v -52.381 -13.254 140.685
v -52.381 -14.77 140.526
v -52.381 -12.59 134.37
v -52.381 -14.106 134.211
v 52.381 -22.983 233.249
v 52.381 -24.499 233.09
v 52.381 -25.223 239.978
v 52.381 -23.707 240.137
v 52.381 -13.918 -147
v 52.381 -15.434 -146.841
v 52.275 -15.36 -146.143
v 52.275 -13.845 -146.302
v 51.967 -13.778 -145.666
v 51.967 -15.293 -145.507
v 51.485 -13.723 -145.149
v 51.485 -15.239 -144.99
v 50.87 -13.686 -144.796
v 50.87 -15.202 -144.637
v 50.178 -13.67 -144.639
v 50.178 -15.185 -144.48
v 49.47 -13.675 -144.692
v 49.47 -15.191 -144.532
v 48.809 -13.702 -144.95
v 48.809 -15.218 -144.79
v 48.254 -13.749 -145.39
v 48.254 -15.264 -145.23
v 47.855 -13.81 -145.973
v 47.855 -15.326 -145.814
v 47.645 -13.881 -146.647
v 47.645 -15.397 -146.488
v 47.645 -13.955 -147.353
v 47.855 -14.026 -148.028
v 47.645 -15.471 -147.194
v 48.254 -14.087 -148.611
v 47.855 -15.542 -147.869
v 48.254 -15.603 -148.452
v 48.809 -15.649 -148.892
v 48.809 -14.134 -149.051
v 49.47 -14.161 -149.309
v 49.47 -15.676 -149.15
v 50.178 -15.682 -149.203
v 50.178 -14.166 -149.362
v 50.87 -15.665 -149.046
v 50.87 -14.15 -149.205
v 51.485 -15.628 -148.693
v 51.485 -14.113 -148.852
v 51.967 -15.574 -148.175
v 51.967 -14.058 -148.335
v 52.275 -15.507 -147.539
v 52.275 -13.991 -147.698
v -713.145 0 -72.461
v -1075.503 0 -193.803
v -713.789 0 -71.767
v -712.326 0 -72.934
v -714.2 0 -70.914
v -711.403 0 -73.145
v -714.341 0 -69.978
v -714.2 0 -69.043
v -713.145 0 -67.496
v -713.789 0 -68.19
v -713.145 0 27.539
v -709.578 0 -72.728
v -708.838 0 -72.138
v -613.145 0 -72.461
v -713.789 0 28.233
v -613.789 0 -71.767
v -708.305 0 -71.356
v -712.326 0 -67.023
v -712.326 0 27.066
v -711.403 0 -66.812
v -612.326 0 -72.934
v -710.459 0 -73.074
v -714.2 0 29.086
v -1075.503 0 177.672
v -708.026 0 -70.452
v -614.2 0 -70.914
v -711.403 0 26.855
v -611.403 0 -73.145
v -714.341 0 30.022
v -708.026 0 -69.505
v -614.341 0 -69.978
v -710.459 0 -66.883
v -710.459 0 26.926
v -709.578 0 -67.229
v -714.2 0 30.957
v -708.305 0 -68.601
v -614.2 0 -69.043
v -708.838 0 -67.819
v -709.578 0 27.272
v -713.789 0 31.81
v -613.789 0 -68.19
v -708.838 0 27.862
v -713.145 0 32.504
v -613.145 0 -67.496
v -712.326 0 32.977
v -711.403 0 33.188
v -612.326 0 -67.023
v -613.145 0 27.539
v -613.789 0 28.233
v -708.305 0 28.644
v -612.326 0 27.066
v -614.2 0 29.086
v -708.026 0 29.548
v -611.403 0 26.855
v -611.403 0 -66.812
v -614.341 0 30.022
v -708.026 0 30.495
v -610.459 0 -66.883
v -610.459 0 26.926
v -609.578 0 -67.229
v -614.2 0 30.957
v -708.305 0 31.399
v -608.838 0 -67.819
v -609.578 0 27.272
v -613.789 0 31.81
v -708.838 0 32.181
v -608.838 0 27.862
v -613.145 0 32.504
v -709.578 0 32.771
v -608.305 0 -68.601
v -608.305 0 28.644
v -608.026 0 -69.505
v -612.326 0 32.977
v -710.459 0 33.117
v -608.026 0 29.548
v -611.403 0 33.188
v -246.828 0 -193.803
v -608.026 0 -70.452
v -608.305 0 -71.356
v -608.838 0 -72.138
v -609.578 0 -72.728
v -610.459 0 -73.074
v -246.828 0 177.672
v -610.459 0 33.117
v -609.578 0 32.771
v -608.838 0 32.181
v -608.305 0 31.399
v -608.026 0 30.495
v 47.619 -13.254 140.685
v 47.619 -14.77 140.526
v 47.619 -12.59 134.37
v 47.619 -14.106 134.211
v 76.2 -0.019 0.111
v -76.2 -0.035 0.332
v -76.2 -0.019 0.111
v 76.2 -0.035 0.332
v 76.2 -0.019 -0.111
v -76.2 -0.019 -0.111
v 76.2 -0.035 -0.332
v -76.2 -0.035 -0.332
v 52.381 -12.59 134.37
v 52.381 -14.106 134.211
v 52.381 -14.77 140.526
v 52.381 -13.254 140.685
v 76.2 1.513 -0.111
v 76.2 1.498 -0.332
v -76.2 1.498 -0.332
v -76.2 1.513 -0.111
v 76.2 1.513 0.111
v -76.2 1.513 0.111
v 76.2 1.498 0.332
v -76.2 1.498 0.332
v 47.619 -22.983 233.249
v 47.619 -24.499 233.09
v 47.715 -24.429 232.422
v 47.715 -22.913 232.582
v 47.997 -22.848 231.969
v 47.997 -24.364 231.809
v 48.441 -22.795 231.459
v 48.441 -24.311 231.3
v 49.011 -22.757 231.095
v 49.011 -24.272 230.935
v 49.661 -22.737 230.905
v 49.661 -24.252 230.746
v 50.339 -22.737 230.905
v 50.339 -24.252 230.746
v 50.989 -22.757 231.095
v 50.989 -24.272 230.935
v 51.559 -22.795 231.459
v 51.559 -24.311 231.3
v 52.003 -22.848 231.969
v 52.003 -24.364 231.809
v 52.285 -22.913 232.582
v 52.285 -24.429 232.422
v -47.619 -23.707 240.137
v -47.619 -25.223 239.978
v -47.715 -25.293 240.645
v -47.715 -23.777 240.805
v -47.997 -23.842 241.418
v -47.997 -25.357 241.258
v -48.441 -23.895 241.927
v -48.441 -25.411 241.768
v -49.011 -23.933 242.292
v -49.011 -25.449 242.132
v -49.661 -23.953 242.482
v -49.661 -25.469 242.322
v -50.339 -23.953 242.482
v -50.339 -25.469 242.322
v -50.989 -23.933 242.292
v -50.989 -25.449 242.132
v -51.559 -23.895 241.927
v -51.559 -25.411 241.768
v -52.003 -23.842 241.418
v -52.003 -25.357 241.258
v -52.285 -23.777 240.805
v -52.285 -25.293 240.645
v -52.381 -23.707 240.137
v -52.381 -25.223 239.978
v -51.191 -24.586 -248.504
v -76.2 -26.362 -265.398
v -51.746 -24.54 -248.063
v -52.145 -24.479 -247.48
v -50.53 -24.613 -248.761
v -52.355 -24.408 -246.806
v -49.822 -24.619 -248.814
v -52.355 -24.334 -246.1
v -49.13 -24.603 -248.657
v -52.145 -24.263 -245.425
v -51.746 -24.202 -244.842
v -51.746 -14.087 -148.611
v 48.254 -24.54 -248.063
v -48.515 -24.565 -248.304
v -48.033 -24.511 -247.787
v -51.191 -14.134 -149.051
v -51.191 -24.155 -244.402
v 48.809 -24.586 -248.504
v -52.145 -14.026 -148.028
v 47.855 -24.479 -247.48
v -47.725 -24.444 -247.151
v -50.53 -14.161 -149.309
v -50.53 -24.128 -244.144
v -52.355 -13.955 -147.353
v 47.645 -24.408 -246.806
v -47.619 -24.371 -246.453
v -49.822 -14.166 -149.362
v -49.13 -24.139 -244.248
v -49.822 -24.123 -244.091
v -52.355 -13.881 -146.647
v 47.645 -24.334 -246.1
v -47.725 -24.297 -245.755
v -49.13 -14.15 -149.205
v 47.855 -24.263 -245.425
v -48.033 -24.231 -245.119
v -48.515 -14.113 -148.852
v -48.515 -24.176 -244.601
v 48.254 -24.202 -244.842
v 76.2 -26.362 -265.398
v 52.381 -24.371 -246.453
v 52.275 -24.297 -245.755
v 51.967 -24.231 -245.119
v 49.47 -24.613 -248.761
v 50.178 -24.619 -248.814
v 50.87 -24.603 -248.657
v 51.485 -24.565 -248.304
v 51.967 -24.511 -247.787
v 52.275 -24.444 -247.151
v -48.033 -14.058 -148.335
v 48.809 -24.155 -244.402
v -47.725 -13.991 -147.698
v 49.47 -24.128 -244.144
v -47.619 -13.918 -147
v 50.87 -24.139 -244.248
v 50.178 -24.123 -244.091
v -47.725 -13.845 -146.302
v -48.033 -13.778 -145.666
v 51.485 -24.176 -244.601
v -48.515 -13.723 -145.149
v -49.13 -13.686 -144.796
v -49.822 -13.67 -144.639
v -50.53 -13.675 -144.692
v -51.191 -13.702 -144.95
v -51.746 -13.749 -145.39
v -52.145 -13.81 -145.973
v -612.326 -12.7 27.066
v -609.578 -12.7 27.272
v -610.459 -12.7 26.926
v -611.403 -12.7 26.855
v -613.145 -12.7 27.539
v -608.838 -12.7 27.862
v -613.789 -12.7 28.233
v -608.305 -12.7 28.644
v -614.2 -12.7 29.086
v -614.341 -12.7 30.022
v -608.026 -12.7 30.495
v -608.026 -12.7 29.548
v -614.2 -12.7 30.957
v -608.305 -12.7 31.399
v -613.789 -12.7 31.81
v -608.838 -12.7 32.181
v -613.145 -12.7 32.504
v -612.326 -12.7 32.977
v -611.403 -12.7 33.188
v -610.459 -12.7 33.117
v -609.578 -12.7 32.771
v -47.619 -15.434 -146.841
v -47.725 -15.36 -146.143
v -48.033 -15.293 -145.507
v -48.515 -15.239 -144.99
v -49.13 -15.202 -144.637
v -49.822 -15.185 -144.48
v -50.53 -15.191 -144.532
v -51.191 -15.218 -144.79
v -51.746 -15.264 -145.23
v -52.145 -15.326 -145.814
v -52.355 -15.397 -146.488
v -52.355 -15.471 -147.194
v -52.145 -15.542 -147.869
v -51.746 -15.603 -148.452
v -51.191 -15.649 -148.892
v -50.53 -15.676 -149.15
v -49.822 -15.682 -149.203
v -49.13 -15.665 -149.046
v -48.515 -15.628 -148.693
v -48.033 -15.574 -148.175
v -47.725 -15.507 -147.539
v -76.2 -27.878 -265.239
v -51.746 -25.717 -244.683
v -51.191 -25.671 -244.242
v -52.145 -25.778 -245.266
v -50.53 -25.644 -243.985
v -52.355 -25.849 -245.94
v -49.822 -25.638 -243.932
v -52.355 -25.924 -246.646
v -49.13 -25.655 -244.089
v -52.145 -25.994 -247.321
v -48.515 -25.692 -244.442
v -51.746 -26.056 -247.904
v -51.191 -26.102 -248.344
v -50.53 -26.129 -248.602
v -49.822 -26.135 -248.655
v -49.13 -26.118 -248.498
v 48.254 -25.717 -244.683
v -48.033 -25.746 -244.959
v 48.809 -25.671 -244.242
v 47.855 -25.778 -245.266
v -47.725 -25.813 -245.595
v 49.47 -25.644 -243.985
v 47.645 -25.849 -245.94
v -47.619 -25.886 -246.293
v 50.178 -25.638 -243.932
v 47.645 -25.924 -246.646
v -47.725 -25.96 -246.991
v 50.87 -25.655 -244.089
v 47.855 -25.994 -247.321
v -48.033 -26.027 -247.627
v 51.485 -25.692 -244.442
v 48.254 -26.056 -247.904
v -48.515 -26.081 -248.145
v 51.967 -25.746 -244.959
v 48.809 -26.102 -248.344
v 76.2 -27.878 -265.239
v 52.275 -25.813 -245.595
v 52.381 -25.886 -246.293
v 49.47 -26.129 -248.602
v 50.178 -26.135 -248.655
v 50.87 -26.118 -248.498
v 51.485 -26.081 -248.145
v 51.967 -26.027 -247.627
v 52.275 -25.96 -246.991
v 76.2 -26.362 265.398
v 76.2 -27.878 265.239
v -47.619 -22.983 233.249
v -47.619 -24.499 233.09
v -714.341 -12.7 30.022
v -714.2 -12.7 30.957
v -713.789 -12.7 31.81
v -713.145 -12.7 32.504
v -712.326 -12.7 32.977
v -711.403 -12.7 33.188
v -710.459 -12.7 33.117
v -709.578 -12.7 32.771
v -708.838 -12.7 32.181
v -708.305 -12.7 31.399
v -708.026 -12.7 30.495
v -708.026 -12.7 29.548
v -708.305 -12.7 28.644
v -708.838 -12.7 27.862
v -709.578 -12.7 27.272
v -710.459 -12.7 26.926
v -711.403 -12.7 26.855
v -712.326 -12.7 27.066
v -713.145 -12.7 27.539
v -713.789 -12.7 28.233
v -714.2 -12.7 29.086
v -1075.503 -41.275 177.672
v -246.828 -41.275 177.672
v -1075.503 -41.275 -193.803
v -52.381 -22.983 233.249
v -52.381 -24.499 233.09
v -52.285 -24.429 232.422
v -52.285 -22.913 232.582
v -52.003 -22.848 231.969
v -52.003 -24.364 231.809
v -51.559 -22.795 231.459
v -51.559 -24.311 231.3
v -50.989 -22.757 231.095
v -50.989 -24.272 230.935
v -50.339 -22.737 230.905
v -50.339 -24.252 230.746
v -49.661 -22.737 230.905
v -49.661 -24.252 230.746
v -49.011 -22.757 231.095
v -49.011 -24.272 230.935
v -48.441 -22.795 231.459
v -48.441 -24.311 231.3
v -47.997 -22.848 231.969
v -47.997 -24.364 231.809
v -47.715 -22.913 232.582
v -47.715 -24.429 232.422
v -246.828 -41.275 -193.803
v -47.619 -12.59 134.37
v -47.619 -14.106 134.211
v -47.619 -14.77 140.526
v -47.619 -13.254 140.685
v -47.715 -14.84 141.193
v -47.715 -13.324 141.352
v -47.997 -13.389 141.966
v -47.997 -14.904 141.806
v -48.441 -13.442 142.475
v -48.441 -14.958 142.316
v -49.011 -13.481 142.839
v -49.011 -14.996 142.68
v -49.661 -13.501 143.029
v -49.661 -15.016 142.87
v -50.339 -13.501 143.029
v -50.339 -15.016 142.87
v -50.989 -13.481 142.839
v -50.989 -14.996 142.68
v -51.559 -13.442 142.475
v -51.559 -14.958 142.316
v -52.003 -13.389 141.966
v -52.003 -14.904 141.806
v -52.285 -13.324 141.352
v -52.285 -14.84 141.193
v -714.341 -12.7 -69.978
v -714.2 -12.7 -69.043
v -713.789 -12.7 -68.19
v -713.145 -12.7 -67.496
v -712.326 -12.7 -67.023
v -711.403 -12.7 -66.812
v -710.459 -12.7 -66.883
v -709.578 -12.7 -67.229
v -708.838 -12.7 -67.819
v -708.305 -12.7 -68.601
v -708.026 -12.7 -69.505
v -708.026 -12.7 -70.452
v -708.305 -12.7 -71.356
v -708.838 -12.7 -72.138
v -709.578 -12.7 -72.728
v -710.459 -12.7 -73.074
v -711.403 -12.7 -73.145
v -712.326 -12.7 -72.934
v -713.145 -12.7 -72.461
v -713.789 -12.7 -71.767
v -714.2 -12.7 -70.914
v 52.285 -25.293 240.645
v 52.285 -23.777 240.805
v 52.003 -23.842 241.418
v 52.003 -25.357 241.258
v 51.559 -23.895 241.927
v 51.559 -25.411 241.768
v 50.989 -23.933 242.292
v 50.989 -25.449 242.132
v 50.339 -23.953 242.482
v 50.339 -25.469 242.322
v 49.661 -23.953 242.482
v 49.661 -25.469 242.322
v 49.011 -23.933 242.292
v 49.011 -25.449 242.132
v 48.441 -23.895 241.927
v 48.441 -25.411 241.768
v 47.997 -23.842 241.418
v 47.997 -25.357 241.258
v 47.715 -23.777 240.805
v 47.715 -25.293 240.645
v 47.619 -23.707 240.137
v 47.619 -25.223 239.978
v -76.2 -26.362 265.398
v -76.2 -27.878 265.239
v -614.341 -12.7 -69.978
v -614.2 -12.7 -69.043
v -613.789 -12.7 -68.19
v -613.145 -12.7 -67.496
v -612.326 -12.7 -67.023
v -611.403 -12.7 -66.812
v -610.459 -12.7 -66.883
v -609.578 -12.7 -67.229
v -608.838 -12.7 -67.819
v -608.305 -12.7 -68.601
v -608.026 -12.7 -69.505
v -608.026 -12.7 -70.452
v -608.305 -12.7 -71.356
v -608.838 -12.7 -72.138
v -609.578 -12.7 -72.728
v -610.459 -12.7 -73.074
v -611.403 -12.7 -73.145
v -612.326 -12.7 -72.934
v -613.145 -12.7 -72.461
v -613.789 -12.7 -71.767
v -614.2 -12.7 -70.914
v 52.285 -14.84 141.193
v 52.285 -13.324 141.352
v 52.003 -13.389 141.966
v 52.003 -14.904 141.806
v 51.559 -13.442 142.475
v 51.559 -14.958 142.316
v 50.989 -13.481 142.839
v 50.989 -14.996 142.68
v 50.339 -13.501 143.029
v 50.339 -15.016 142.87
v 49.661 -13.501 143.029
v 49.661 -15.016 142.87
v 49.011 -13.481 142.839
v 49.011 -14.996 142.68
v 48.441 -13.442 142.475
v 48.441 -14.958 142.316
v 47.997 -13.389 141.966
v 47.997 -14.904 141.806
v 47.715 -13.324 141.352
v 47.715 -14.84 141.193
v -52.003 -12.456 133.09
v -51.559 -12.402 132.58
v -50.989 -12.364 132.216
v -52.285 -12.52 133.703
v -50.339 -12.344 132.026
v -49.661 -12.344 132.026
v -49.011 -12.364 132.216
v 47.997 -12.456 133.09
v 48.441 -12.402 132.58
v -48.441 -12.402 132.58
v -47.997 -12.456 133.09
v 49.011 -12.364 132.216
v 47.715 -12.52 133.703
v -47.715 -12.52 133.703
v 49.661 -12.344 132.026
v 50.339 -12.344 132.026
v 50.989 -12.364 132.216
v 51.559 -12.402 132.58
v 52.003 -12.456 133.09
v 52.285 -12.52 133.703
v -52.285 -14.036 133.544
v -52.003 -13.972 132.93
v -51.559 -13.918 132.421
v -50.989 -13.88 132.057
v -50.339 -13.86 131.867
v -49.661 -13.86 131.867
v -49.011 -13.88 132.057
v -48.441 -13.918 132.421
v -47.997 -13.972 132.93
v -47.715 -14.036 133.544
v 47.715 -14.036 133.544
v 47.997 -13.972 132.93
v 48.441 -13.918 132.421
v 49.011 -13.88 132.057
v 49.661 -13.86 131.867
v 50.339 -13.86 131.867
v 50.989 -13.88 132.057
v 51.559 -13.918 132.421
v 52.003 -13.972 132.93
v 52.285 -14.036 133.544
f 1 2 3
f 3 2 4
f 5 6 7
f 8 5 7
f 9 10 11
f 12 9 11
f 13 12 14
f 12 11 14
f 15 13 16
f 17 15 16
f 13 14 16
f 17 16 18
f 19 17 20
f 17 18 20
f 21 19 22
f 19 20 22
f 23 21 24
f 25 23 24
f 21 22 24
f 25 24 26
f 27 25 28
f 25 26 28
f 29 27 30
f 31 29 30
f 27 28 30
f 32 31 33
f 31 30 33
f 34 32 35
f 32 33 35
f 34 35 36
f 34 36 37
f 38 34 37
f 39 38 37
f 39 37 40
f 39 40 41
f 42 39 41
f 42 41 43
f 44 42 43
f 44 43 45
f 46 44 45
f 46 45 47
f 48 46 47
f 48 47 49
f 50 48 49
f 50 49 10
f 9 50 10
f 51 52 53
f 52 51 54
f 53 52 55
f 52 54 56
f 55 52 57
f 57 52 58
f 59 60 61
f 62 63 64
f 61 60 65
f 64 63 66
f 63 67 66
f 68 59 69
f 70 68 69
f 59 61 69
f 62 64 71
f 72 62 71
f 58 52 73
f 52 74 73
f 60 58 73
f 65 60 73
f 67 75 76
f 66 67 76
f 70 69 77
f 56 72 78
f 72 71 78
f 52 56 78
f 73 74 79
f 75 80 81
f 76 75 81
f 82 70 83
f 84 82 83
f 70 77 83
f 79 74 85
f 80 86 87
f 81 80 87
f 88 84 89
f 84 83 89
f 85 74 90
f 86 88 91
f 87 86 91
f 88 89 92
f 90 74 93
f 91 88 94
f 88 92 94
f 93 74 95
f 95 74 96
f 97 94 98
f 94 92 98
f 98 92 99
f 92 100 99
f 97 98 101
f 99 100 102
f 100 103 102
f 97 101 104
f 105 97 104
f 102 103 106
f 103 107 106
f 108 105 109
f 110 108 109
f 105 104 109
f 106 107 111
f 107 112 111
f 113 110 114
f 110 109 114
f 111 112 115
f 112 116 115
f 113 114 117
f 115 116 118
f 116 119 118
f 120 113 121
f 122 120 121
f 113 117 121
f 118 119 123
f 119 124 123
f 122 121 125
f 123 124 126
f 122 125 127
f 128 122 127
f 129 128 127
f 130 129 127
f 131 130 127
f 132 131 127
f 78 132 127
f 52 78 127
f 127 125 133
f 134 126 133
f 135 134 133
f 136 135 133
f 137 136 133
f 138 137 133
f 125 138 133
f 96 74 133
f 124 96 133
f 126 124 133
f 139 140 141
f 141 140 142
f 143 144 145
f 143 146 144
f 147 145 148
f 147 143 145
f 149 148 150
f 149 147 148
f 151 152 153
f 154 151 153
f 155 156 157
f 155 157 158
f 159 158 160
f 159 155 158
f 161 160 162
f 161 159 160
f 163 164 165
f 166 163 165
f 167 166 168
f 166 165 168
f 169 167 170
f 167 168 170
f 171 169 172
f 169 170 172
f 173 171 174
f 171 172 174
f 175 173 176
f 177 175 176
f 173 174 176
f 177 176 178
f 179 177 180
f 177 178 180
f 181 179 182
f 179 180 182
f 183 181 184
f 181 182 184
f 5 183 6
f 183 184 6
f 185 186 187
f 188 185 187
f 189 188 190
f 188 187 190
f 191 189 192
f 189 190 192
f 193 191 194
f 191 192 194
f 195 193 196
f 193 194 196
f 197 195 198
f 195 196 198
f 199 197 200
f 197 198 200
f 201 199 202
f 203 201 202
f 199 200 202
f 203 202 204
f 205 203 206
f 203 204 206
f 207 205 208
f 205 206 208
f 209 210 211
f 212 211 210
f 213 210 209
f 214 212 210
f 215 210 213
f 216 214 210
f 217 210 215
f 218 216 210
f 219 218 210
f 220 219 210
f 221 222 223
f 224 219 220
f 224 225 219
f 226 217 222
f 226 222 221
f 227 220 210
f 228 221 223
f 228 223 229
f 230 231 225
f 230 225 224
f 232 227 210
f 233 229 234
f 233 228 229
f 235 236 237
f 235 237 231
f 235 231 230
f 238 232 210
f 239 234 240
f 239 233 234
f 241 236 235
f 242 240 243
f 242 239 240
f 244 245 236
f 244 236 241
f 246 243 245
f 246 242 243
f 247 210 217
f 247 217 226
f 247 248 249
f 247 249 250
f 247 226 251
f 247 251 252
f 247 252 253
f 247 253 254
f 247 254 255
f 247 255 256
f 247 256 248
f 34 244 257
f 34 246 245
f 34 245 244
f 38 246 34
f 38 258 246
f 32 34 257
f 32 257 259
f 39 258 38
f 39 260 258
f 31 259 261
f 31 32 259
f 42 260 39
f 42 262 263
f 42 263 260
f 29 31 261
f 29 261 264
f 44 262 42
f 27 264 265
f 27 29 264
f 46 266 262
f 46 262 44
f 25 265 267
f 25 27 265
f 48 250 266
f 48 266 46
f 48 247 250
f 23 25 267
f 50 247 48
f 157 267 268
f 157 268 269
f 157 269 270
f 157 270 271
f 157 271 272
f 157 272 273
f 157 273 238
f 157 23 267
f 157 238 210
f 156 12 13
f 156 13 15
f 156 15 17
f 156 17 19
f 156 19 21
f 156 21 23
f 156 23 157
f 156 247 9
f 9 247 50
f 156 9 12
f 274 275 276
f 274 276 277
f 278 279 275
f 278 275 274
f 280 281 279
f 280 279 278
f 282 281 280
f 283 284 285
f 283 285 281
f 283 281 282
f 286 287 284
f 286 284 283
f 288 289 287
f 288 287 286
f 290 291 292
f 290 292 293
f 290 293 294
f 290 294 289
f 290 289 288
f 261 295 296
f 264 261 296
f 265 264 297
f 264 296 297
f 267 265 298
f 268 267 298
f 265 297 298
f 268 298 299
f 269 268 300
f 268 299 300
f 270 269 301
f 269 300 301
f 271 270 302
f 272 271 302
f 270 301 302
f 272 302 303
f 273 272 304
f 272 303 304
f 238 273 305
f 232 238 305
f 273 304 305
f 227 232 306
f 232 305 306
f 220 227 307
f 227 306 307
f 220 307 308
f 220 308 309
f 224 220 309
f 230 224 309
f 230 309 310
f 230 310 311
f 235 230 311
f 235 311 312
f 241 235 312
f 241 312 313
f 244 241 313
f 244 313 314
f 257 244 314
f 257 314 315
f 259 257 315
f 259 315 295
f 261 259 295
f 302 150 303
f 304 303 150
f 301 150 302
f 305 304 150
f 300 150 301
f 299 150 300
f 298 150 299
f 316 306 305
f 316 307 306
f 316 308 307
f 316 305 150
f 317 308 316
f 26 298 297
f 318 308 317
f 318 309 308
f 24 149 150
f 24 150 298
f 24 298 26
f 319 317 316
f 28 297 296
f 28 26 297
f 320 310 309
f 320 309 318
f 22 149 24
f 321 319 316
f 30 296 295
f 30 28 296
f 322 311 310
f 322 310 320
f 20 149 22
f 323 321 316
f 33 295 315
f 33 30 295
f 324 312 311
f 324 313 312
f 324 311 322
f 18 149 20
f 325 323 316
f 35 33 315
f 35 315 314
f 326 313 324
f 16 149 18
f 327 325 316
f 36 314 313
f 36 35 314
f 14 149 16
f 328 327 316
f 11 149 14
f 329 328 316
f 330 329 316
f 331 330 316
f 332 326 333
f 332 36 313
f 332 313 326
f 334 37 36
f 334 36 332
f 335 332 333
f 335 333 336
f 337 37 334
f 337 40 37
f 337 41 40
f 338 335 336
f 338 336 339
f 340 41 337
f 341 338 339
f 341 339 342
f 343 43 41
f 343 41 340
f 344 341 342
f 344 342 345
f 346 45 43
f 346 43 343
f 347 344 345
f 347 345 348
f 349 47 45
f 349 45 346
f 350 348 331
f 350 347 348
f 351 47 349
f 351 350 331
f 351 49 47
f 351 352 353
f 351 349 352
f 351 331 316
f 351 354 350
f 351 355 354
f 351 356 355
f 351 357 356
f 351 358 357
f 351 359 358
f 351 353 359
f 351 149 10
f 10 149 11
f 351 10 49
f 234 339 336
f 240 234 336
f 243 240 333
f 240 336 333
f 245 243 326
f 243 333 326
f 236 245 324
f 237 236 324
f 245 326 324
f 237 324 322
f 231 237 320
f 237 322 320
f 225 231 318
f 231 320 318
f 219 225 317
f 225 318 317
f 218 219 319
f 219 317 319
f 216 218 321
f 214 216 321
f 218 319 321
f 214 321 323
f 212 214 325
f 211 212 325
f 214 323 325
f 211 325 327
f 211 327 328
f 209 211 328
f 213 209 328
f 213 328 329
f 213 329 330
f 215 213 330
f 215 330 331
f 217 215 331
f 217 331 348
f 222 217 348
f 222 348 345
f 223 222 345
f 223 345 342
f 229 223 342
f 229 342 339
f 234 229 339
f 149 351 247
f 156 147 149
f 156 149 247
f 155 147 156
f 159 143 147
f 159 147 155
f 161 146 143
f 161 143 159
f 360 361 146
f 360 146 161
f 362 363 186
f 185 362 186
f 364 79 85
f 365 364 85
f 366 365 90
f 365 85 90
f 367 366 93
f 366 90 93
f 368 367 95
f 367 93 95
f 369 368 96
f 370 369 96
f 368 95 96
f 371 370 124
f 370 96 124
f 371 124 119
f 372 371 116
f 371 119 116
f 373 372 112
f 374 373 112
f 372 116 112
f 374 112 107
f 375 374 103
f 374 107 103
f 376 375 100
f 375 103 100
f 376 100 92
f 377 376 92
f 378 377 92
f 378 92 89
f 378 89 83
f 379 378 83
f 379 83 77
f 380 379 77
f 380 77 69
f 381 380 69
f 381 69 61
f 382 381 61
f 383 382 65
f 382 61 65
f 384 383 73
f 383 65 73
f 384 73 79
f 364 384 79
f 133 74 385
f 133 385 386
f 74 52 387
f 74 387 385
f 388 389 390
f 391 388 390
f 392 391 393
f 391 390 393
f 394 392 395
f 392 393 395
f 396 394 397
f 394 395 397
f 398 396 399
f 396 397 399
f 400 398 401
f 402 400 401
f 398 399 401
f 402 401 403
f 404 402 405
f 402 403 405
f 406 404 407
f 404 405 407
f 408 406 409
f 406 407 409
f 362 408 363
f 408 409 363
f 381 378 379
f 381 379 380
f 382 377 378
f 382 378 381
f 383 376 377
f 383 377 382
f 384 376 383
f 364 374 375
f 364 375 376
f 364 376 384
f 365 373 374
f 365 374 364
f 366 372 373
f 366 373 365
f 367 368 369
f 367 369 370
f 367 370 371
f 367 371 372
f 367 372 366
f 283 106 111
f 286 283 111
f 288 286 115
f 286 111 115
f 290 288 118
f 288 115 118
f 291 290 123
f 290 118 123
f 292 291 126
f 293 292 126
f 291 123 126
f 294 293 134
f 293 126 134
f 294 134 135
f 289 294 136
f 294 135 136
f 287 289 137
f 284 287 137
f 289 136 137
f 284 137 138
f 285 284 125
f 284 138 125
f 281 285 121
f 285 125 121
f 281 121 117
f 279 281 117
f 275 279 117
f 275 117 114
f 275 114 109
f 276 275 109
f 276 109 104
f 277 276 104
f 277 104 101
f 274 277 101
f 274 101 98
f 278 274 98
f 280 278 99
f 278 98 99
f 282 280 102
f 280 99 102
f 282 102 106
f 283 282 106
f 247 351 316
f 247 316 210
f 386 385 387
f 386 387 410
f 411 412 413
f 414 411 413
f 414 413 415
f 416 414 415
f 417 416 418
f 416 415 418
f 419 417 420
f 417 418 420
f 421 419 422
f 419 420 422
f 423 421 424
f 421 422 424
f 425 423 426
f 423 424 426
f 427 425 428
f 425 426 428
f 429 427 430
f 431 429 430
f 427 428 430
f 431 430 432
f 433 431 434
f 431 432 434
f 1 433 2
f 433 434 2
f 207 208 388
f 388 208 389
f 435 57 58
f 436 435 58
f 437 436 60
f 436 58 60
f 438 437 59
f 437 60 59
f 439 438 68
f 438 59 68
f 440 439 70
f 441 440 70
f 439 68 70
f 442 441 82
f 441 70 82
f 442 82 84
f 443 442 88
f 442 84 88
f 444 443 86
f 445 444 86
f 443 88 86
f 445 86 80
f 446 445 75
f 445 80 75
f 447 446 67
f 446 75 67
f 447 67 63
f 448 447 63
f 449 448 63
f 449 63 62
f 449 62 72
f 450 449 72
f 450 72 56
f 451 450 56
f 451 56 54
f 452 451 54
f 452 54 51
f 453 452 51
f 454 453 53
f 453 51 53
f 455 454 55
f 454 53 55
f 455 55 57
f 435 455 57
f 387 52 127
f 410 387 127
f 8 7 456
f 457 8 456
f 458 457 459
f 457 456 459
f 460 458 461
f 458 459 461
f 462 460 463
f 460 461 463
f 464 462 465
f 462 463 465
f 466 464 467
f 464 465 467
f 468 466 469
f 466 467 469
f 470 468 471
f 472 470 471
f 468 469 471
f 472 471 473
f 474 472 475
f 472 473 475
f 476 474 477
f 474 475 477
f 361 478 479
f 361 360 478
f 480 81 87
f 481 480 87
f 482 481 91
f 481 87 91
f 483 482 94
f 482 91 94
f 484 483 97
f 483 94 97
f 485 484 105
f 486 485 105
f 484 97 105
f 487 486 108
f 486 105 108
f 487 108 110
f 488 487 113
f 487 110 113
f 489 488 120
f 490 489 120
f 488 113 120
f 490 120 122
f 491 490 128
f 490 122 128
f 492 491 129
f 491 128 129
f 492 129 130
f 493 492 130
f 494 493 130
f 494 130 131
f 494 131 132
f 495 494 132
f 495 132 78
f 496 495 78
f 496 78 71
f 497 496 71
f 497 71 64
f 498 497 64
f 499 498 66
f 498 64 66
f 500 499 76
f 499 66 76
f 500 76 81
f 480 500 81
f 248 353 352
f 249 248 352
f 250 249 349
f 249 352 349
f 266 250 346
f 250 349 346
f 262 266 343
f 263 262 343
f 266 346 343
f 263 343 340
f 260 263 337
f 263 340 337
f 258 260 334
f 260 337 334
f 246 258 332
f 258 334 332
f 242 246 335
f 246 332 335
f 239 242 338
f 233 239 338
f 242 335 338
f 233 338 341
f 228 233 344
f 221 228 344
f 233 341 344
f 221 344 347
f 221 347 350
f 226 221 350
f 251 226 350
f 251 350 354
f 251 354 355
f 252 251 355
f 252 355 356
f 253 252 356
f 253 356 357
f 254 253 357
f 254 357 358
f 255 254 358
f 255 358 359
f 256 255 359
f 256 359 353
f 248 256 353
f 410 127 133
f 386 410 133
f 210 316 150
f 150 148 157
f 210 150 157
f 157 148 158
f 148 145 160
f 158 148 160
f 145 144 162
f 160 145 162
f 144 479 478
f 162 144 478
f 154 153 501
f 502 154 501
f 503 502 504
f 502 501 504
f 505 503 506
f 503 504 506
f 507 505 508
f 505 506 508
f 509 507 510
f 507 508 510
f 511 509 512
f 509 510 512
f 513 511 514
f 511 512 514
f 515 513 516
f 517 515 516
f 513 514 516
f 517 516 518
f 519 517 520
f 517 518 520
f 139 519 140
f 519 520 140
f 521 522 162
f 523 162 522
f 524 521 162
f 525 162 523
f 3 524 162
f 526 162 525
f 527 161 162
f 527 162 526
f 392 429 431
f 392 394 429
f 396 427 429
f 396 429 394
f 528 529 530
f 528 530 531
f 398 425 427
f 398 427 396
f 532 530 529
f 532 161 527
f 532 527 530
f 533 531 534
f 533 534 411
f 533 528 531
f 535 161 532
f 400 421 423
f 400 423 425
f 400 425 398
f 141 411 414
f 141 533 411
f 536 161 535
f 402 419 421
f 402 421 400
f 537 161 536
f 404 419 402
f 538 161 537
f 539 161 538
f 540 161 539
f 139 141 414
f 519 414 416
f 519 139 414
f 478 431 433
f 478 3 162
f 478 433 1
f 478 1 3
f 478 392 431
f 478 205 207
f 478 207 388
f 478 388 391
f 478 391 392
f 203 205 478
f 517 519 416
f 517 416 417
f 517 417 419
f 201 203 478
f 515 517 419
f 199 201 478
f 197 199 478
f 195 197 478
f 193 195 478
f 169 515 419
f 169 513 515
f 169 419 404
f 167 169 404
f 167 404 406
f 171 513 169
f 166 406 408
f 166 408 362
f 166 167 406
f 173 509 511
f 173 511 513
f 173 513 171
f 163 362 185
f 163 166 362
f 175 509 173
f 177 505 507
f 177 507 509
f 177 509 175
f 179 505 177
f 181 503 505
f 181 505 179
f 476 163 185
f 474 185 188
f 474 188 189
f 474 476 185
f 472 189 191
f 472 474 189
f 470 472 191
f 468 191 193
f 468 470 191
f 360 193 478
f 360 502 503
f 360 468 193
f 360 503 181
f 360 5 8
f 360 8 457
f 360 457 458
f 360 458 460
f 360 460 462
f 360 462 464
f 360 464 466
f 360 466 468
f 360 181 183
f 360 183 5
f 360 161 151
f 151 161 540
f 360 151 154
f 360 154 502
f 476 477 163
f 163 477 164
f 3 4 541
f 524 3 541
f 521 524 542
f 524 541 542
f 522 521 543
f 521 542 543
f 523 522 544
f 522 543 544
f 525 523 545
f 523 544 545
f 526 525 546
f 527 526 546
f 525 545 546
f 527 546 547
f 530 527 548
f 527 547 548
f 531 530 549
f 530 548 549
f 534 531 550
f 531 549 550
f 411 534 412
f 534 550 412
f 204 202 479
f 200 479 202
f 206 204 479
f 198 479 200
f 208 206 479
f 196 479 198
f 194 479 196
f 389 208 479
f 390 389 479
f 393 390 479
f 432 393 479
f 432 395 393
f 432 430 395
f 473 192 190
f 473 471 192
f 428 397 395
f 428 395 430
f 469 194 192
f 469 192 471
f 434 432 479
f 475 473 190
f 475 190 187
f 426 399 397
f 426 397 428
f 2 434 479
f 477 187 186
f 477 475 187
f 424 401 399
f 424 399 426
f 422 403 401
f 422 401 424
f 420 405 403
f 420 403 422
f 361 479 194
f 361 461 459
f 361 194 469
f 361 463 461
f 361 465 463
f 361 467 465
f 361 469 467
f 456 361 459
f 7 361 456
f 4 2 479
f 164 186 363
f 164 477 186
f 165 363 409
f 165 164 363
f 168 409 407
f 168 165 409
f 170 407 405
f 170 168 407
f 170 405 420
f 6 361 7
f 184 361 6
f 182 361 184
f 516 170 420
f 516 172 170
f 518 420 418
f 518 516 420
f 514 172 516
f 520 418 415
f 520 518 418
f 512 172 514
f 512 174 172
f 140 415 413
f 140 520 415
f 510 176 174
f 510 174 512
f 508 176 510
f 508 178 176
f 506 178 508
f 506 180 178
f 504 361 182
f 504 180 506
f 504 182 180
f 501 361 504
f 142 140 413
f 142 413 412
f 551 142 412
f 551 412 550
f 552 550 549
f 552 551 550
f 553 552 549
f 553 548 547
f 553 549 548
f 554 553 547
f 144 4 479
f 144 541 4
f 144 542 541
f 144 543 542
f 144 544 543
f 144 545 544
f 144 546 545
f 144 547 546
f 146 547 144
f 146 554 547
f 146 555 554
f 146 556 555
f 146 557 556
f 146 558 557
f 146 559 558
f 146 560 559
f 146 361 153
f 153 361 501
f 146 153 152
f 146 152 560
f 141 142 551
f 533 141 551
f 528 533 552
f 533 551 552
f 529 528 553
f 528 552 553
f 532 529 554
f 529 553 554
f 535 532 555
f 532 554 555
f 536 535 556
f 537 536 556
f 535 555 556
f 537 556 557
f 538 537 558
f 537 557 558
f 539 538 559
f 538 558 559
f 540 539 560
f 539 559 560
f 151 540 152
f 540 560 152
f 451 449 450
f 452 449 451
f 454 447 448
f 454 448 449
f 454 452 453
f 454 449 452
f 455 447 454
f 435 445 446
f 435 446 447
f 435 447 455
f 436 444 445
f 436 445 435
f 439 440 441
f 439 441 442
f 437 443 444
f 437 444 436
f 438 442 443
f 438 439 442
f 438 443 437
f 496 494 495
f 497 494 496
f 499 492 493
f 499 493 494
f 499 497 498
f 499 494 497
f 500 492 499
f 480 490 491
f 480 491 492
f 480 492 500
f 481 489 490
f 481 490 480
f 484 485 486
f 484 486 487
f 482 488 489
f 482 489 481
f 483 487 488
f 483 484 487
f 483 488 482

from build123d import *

# Parameters (mm, degrees)
F1_DEPTH      = 76.2
F1_DEPTH_BACK = 76.2
F2_R          = 2.38125
F3_DEPTH      = 29.2492825166
F5_DEPTH      = 29.2492825166
F6_W          = 828.675
F6_H          = 371.475
F7_DEPTH      = 41.275
F8_R          = 3.175
F9_DEPTH      = 12.7


with BuildPart() as f1:
    # F0 (on Right) → F1 (new body, two sides)
    with BuildSketch(Plane.YZ) as f1_sk:
        with BuildLine():
            ThreePointArc((-0.0348817698, 0.3318778709), (-0.0174887876, 0), (-0.0348817698, -0.3318778709))
            Line((-0.0348817698, -0.3318778709), (-27.8777411535, -265.2389894947))
            Line((-27.8777411535, -265.2389894947), (-26.3620897849, -265.3982908727))
            Line((-26.3620897849, -265.3982908727), (1.4975128482, -0.3318778709))
            ThreePointArc((1.4975128482, -0.3318778709), (1.5149058304, 0), (1.4975128482, 0.3318778709))
            Line((1.4975128482, 0.3318778709), (-26.3620897849, 265.3982908727))
            Line((-26.3620897849, 265.3982908727), (-27.8777411535, 265.2389894947))
            Line((-27.8777411535, 265.2389894947), (-0.0348817698, 0.3318778709))
        make_face()
    extrude(amount=F1_DEPTH)
    extrude(f1_sk.sketch, amount=-F1_DEPTH_BACK)

    # F2 (on face) → F3 (cut, through all)
    with BuildSketch(Plane(origin=(0, 0, 0), x_dir=(1, 0, 0), z_dir=(0, -0.9945218954, 0.1045284633))):
        with Locations((-50, -147.65)):
            Circle(F2_R)
        with Locations((50, -147.65)):
            Circle(F2_R)
        with Locations((50, -247.65)):
            Circle(F2_R)
        with Locations((-50, -247.65)):
            Circle(F2_R)
    extrude(amount=-F3_DEPTH, mode=Mode.SUBTRACT)

    # F4 (on face) → F5 (cut, through all)
    with BuildSketch(Plane(origin=(0, 0, 0), x_dir=(1, 0, 0), z_dir=(0, -0.9945218954, -0.1045284633))):
        with BuildLine():
            ThreePointArc((-47.61875, 241.3), (-50, 243.68125), (-52.38125, 241.3))
            Line((-52.38125, 241.3), (-52.38125, 234.3735230446))
            ThreePointArc((-52.38125, 234.3735230446), (-50, 231.9922730446), (-47.61875, 234.3735230446))
            Line((-47.61875, 234.3735230446), (-47.61875, 241.3))
        make_face()
        with BuildLine():
            ThreePointArc((52.38125, 241.3), (50, 243.68125), (47.61875, 241.3))
            Line((47.61875, 241.3), (47.61875, 234.3735230446))
            ThreePointArc((47.61875, 234.3735230446), (50, 231.9922730446), (52.38125, 234.3735230446))
            Line((52.38125, 234.3735230446), (52.38125, 241.3))
        make_face()
        with BuildLine():
            Line((52.38125, 134.95), (52.38125, 141.3))
            ThreePointArc((52.38125, 141.3), (50, 143.68125), (47.61875, 141.3))
            Line((47.61875, 141.3), (47.61875, 134.95))
            ThreePointArc((47.61875, 134.95), (50, 132.56875), (52.38125, 134.95))
        make_face()
        with BuildLine():
            ThreePointArc((-47.61875, 141.3), (-50, 143.68125), (-52.38125, 141.3))
            Line((-52.38125, 141.3), (-52.38125, 134.95))
            ThreePointArc((-52.38125, 134.95), (-50, 132.56875), (-47.61875, 134.95))
            Line((-47.61875, 134.95), (-47.61875, 141.3))
        make_face()
    extrude(amount=-F5_DEPTH, mode=Mode.SUBTRACT)


with BuildPart() as f7:
    # F6 (on Front) → F7 (new body)
    with BuildSketch(Plane.XZ):
        with Locations((-661.1656835318, -8.0659929991)):
            Rectangle(F6_W, F6_H)
    extrude(amount=F7_DEPTH)

    # F8 (on face) → F9 (cut)
    with BuildSketch(Plane(origin=(0, 0, 0), x_dir=(-1, 0, 0), z_dir=(0, 1, 0))):
        with Locations((611.1656835318, 30.0215070009)):
            Circle(F8_R)
        with Locations((711.1656835318, 30.0215070009)):
            Circle(F8_R)
        with Locations((611.1656835318, -69.9784929991)):
            Circle(F8_R)
        with Locations((711.1656835318, -69.9784929991)):
            Circle(F8_R)
    extrude(amount=-F9_DEPTH, mode=Mode.SUBTRACT)


solid = Compound([f1.part, f7.part])
